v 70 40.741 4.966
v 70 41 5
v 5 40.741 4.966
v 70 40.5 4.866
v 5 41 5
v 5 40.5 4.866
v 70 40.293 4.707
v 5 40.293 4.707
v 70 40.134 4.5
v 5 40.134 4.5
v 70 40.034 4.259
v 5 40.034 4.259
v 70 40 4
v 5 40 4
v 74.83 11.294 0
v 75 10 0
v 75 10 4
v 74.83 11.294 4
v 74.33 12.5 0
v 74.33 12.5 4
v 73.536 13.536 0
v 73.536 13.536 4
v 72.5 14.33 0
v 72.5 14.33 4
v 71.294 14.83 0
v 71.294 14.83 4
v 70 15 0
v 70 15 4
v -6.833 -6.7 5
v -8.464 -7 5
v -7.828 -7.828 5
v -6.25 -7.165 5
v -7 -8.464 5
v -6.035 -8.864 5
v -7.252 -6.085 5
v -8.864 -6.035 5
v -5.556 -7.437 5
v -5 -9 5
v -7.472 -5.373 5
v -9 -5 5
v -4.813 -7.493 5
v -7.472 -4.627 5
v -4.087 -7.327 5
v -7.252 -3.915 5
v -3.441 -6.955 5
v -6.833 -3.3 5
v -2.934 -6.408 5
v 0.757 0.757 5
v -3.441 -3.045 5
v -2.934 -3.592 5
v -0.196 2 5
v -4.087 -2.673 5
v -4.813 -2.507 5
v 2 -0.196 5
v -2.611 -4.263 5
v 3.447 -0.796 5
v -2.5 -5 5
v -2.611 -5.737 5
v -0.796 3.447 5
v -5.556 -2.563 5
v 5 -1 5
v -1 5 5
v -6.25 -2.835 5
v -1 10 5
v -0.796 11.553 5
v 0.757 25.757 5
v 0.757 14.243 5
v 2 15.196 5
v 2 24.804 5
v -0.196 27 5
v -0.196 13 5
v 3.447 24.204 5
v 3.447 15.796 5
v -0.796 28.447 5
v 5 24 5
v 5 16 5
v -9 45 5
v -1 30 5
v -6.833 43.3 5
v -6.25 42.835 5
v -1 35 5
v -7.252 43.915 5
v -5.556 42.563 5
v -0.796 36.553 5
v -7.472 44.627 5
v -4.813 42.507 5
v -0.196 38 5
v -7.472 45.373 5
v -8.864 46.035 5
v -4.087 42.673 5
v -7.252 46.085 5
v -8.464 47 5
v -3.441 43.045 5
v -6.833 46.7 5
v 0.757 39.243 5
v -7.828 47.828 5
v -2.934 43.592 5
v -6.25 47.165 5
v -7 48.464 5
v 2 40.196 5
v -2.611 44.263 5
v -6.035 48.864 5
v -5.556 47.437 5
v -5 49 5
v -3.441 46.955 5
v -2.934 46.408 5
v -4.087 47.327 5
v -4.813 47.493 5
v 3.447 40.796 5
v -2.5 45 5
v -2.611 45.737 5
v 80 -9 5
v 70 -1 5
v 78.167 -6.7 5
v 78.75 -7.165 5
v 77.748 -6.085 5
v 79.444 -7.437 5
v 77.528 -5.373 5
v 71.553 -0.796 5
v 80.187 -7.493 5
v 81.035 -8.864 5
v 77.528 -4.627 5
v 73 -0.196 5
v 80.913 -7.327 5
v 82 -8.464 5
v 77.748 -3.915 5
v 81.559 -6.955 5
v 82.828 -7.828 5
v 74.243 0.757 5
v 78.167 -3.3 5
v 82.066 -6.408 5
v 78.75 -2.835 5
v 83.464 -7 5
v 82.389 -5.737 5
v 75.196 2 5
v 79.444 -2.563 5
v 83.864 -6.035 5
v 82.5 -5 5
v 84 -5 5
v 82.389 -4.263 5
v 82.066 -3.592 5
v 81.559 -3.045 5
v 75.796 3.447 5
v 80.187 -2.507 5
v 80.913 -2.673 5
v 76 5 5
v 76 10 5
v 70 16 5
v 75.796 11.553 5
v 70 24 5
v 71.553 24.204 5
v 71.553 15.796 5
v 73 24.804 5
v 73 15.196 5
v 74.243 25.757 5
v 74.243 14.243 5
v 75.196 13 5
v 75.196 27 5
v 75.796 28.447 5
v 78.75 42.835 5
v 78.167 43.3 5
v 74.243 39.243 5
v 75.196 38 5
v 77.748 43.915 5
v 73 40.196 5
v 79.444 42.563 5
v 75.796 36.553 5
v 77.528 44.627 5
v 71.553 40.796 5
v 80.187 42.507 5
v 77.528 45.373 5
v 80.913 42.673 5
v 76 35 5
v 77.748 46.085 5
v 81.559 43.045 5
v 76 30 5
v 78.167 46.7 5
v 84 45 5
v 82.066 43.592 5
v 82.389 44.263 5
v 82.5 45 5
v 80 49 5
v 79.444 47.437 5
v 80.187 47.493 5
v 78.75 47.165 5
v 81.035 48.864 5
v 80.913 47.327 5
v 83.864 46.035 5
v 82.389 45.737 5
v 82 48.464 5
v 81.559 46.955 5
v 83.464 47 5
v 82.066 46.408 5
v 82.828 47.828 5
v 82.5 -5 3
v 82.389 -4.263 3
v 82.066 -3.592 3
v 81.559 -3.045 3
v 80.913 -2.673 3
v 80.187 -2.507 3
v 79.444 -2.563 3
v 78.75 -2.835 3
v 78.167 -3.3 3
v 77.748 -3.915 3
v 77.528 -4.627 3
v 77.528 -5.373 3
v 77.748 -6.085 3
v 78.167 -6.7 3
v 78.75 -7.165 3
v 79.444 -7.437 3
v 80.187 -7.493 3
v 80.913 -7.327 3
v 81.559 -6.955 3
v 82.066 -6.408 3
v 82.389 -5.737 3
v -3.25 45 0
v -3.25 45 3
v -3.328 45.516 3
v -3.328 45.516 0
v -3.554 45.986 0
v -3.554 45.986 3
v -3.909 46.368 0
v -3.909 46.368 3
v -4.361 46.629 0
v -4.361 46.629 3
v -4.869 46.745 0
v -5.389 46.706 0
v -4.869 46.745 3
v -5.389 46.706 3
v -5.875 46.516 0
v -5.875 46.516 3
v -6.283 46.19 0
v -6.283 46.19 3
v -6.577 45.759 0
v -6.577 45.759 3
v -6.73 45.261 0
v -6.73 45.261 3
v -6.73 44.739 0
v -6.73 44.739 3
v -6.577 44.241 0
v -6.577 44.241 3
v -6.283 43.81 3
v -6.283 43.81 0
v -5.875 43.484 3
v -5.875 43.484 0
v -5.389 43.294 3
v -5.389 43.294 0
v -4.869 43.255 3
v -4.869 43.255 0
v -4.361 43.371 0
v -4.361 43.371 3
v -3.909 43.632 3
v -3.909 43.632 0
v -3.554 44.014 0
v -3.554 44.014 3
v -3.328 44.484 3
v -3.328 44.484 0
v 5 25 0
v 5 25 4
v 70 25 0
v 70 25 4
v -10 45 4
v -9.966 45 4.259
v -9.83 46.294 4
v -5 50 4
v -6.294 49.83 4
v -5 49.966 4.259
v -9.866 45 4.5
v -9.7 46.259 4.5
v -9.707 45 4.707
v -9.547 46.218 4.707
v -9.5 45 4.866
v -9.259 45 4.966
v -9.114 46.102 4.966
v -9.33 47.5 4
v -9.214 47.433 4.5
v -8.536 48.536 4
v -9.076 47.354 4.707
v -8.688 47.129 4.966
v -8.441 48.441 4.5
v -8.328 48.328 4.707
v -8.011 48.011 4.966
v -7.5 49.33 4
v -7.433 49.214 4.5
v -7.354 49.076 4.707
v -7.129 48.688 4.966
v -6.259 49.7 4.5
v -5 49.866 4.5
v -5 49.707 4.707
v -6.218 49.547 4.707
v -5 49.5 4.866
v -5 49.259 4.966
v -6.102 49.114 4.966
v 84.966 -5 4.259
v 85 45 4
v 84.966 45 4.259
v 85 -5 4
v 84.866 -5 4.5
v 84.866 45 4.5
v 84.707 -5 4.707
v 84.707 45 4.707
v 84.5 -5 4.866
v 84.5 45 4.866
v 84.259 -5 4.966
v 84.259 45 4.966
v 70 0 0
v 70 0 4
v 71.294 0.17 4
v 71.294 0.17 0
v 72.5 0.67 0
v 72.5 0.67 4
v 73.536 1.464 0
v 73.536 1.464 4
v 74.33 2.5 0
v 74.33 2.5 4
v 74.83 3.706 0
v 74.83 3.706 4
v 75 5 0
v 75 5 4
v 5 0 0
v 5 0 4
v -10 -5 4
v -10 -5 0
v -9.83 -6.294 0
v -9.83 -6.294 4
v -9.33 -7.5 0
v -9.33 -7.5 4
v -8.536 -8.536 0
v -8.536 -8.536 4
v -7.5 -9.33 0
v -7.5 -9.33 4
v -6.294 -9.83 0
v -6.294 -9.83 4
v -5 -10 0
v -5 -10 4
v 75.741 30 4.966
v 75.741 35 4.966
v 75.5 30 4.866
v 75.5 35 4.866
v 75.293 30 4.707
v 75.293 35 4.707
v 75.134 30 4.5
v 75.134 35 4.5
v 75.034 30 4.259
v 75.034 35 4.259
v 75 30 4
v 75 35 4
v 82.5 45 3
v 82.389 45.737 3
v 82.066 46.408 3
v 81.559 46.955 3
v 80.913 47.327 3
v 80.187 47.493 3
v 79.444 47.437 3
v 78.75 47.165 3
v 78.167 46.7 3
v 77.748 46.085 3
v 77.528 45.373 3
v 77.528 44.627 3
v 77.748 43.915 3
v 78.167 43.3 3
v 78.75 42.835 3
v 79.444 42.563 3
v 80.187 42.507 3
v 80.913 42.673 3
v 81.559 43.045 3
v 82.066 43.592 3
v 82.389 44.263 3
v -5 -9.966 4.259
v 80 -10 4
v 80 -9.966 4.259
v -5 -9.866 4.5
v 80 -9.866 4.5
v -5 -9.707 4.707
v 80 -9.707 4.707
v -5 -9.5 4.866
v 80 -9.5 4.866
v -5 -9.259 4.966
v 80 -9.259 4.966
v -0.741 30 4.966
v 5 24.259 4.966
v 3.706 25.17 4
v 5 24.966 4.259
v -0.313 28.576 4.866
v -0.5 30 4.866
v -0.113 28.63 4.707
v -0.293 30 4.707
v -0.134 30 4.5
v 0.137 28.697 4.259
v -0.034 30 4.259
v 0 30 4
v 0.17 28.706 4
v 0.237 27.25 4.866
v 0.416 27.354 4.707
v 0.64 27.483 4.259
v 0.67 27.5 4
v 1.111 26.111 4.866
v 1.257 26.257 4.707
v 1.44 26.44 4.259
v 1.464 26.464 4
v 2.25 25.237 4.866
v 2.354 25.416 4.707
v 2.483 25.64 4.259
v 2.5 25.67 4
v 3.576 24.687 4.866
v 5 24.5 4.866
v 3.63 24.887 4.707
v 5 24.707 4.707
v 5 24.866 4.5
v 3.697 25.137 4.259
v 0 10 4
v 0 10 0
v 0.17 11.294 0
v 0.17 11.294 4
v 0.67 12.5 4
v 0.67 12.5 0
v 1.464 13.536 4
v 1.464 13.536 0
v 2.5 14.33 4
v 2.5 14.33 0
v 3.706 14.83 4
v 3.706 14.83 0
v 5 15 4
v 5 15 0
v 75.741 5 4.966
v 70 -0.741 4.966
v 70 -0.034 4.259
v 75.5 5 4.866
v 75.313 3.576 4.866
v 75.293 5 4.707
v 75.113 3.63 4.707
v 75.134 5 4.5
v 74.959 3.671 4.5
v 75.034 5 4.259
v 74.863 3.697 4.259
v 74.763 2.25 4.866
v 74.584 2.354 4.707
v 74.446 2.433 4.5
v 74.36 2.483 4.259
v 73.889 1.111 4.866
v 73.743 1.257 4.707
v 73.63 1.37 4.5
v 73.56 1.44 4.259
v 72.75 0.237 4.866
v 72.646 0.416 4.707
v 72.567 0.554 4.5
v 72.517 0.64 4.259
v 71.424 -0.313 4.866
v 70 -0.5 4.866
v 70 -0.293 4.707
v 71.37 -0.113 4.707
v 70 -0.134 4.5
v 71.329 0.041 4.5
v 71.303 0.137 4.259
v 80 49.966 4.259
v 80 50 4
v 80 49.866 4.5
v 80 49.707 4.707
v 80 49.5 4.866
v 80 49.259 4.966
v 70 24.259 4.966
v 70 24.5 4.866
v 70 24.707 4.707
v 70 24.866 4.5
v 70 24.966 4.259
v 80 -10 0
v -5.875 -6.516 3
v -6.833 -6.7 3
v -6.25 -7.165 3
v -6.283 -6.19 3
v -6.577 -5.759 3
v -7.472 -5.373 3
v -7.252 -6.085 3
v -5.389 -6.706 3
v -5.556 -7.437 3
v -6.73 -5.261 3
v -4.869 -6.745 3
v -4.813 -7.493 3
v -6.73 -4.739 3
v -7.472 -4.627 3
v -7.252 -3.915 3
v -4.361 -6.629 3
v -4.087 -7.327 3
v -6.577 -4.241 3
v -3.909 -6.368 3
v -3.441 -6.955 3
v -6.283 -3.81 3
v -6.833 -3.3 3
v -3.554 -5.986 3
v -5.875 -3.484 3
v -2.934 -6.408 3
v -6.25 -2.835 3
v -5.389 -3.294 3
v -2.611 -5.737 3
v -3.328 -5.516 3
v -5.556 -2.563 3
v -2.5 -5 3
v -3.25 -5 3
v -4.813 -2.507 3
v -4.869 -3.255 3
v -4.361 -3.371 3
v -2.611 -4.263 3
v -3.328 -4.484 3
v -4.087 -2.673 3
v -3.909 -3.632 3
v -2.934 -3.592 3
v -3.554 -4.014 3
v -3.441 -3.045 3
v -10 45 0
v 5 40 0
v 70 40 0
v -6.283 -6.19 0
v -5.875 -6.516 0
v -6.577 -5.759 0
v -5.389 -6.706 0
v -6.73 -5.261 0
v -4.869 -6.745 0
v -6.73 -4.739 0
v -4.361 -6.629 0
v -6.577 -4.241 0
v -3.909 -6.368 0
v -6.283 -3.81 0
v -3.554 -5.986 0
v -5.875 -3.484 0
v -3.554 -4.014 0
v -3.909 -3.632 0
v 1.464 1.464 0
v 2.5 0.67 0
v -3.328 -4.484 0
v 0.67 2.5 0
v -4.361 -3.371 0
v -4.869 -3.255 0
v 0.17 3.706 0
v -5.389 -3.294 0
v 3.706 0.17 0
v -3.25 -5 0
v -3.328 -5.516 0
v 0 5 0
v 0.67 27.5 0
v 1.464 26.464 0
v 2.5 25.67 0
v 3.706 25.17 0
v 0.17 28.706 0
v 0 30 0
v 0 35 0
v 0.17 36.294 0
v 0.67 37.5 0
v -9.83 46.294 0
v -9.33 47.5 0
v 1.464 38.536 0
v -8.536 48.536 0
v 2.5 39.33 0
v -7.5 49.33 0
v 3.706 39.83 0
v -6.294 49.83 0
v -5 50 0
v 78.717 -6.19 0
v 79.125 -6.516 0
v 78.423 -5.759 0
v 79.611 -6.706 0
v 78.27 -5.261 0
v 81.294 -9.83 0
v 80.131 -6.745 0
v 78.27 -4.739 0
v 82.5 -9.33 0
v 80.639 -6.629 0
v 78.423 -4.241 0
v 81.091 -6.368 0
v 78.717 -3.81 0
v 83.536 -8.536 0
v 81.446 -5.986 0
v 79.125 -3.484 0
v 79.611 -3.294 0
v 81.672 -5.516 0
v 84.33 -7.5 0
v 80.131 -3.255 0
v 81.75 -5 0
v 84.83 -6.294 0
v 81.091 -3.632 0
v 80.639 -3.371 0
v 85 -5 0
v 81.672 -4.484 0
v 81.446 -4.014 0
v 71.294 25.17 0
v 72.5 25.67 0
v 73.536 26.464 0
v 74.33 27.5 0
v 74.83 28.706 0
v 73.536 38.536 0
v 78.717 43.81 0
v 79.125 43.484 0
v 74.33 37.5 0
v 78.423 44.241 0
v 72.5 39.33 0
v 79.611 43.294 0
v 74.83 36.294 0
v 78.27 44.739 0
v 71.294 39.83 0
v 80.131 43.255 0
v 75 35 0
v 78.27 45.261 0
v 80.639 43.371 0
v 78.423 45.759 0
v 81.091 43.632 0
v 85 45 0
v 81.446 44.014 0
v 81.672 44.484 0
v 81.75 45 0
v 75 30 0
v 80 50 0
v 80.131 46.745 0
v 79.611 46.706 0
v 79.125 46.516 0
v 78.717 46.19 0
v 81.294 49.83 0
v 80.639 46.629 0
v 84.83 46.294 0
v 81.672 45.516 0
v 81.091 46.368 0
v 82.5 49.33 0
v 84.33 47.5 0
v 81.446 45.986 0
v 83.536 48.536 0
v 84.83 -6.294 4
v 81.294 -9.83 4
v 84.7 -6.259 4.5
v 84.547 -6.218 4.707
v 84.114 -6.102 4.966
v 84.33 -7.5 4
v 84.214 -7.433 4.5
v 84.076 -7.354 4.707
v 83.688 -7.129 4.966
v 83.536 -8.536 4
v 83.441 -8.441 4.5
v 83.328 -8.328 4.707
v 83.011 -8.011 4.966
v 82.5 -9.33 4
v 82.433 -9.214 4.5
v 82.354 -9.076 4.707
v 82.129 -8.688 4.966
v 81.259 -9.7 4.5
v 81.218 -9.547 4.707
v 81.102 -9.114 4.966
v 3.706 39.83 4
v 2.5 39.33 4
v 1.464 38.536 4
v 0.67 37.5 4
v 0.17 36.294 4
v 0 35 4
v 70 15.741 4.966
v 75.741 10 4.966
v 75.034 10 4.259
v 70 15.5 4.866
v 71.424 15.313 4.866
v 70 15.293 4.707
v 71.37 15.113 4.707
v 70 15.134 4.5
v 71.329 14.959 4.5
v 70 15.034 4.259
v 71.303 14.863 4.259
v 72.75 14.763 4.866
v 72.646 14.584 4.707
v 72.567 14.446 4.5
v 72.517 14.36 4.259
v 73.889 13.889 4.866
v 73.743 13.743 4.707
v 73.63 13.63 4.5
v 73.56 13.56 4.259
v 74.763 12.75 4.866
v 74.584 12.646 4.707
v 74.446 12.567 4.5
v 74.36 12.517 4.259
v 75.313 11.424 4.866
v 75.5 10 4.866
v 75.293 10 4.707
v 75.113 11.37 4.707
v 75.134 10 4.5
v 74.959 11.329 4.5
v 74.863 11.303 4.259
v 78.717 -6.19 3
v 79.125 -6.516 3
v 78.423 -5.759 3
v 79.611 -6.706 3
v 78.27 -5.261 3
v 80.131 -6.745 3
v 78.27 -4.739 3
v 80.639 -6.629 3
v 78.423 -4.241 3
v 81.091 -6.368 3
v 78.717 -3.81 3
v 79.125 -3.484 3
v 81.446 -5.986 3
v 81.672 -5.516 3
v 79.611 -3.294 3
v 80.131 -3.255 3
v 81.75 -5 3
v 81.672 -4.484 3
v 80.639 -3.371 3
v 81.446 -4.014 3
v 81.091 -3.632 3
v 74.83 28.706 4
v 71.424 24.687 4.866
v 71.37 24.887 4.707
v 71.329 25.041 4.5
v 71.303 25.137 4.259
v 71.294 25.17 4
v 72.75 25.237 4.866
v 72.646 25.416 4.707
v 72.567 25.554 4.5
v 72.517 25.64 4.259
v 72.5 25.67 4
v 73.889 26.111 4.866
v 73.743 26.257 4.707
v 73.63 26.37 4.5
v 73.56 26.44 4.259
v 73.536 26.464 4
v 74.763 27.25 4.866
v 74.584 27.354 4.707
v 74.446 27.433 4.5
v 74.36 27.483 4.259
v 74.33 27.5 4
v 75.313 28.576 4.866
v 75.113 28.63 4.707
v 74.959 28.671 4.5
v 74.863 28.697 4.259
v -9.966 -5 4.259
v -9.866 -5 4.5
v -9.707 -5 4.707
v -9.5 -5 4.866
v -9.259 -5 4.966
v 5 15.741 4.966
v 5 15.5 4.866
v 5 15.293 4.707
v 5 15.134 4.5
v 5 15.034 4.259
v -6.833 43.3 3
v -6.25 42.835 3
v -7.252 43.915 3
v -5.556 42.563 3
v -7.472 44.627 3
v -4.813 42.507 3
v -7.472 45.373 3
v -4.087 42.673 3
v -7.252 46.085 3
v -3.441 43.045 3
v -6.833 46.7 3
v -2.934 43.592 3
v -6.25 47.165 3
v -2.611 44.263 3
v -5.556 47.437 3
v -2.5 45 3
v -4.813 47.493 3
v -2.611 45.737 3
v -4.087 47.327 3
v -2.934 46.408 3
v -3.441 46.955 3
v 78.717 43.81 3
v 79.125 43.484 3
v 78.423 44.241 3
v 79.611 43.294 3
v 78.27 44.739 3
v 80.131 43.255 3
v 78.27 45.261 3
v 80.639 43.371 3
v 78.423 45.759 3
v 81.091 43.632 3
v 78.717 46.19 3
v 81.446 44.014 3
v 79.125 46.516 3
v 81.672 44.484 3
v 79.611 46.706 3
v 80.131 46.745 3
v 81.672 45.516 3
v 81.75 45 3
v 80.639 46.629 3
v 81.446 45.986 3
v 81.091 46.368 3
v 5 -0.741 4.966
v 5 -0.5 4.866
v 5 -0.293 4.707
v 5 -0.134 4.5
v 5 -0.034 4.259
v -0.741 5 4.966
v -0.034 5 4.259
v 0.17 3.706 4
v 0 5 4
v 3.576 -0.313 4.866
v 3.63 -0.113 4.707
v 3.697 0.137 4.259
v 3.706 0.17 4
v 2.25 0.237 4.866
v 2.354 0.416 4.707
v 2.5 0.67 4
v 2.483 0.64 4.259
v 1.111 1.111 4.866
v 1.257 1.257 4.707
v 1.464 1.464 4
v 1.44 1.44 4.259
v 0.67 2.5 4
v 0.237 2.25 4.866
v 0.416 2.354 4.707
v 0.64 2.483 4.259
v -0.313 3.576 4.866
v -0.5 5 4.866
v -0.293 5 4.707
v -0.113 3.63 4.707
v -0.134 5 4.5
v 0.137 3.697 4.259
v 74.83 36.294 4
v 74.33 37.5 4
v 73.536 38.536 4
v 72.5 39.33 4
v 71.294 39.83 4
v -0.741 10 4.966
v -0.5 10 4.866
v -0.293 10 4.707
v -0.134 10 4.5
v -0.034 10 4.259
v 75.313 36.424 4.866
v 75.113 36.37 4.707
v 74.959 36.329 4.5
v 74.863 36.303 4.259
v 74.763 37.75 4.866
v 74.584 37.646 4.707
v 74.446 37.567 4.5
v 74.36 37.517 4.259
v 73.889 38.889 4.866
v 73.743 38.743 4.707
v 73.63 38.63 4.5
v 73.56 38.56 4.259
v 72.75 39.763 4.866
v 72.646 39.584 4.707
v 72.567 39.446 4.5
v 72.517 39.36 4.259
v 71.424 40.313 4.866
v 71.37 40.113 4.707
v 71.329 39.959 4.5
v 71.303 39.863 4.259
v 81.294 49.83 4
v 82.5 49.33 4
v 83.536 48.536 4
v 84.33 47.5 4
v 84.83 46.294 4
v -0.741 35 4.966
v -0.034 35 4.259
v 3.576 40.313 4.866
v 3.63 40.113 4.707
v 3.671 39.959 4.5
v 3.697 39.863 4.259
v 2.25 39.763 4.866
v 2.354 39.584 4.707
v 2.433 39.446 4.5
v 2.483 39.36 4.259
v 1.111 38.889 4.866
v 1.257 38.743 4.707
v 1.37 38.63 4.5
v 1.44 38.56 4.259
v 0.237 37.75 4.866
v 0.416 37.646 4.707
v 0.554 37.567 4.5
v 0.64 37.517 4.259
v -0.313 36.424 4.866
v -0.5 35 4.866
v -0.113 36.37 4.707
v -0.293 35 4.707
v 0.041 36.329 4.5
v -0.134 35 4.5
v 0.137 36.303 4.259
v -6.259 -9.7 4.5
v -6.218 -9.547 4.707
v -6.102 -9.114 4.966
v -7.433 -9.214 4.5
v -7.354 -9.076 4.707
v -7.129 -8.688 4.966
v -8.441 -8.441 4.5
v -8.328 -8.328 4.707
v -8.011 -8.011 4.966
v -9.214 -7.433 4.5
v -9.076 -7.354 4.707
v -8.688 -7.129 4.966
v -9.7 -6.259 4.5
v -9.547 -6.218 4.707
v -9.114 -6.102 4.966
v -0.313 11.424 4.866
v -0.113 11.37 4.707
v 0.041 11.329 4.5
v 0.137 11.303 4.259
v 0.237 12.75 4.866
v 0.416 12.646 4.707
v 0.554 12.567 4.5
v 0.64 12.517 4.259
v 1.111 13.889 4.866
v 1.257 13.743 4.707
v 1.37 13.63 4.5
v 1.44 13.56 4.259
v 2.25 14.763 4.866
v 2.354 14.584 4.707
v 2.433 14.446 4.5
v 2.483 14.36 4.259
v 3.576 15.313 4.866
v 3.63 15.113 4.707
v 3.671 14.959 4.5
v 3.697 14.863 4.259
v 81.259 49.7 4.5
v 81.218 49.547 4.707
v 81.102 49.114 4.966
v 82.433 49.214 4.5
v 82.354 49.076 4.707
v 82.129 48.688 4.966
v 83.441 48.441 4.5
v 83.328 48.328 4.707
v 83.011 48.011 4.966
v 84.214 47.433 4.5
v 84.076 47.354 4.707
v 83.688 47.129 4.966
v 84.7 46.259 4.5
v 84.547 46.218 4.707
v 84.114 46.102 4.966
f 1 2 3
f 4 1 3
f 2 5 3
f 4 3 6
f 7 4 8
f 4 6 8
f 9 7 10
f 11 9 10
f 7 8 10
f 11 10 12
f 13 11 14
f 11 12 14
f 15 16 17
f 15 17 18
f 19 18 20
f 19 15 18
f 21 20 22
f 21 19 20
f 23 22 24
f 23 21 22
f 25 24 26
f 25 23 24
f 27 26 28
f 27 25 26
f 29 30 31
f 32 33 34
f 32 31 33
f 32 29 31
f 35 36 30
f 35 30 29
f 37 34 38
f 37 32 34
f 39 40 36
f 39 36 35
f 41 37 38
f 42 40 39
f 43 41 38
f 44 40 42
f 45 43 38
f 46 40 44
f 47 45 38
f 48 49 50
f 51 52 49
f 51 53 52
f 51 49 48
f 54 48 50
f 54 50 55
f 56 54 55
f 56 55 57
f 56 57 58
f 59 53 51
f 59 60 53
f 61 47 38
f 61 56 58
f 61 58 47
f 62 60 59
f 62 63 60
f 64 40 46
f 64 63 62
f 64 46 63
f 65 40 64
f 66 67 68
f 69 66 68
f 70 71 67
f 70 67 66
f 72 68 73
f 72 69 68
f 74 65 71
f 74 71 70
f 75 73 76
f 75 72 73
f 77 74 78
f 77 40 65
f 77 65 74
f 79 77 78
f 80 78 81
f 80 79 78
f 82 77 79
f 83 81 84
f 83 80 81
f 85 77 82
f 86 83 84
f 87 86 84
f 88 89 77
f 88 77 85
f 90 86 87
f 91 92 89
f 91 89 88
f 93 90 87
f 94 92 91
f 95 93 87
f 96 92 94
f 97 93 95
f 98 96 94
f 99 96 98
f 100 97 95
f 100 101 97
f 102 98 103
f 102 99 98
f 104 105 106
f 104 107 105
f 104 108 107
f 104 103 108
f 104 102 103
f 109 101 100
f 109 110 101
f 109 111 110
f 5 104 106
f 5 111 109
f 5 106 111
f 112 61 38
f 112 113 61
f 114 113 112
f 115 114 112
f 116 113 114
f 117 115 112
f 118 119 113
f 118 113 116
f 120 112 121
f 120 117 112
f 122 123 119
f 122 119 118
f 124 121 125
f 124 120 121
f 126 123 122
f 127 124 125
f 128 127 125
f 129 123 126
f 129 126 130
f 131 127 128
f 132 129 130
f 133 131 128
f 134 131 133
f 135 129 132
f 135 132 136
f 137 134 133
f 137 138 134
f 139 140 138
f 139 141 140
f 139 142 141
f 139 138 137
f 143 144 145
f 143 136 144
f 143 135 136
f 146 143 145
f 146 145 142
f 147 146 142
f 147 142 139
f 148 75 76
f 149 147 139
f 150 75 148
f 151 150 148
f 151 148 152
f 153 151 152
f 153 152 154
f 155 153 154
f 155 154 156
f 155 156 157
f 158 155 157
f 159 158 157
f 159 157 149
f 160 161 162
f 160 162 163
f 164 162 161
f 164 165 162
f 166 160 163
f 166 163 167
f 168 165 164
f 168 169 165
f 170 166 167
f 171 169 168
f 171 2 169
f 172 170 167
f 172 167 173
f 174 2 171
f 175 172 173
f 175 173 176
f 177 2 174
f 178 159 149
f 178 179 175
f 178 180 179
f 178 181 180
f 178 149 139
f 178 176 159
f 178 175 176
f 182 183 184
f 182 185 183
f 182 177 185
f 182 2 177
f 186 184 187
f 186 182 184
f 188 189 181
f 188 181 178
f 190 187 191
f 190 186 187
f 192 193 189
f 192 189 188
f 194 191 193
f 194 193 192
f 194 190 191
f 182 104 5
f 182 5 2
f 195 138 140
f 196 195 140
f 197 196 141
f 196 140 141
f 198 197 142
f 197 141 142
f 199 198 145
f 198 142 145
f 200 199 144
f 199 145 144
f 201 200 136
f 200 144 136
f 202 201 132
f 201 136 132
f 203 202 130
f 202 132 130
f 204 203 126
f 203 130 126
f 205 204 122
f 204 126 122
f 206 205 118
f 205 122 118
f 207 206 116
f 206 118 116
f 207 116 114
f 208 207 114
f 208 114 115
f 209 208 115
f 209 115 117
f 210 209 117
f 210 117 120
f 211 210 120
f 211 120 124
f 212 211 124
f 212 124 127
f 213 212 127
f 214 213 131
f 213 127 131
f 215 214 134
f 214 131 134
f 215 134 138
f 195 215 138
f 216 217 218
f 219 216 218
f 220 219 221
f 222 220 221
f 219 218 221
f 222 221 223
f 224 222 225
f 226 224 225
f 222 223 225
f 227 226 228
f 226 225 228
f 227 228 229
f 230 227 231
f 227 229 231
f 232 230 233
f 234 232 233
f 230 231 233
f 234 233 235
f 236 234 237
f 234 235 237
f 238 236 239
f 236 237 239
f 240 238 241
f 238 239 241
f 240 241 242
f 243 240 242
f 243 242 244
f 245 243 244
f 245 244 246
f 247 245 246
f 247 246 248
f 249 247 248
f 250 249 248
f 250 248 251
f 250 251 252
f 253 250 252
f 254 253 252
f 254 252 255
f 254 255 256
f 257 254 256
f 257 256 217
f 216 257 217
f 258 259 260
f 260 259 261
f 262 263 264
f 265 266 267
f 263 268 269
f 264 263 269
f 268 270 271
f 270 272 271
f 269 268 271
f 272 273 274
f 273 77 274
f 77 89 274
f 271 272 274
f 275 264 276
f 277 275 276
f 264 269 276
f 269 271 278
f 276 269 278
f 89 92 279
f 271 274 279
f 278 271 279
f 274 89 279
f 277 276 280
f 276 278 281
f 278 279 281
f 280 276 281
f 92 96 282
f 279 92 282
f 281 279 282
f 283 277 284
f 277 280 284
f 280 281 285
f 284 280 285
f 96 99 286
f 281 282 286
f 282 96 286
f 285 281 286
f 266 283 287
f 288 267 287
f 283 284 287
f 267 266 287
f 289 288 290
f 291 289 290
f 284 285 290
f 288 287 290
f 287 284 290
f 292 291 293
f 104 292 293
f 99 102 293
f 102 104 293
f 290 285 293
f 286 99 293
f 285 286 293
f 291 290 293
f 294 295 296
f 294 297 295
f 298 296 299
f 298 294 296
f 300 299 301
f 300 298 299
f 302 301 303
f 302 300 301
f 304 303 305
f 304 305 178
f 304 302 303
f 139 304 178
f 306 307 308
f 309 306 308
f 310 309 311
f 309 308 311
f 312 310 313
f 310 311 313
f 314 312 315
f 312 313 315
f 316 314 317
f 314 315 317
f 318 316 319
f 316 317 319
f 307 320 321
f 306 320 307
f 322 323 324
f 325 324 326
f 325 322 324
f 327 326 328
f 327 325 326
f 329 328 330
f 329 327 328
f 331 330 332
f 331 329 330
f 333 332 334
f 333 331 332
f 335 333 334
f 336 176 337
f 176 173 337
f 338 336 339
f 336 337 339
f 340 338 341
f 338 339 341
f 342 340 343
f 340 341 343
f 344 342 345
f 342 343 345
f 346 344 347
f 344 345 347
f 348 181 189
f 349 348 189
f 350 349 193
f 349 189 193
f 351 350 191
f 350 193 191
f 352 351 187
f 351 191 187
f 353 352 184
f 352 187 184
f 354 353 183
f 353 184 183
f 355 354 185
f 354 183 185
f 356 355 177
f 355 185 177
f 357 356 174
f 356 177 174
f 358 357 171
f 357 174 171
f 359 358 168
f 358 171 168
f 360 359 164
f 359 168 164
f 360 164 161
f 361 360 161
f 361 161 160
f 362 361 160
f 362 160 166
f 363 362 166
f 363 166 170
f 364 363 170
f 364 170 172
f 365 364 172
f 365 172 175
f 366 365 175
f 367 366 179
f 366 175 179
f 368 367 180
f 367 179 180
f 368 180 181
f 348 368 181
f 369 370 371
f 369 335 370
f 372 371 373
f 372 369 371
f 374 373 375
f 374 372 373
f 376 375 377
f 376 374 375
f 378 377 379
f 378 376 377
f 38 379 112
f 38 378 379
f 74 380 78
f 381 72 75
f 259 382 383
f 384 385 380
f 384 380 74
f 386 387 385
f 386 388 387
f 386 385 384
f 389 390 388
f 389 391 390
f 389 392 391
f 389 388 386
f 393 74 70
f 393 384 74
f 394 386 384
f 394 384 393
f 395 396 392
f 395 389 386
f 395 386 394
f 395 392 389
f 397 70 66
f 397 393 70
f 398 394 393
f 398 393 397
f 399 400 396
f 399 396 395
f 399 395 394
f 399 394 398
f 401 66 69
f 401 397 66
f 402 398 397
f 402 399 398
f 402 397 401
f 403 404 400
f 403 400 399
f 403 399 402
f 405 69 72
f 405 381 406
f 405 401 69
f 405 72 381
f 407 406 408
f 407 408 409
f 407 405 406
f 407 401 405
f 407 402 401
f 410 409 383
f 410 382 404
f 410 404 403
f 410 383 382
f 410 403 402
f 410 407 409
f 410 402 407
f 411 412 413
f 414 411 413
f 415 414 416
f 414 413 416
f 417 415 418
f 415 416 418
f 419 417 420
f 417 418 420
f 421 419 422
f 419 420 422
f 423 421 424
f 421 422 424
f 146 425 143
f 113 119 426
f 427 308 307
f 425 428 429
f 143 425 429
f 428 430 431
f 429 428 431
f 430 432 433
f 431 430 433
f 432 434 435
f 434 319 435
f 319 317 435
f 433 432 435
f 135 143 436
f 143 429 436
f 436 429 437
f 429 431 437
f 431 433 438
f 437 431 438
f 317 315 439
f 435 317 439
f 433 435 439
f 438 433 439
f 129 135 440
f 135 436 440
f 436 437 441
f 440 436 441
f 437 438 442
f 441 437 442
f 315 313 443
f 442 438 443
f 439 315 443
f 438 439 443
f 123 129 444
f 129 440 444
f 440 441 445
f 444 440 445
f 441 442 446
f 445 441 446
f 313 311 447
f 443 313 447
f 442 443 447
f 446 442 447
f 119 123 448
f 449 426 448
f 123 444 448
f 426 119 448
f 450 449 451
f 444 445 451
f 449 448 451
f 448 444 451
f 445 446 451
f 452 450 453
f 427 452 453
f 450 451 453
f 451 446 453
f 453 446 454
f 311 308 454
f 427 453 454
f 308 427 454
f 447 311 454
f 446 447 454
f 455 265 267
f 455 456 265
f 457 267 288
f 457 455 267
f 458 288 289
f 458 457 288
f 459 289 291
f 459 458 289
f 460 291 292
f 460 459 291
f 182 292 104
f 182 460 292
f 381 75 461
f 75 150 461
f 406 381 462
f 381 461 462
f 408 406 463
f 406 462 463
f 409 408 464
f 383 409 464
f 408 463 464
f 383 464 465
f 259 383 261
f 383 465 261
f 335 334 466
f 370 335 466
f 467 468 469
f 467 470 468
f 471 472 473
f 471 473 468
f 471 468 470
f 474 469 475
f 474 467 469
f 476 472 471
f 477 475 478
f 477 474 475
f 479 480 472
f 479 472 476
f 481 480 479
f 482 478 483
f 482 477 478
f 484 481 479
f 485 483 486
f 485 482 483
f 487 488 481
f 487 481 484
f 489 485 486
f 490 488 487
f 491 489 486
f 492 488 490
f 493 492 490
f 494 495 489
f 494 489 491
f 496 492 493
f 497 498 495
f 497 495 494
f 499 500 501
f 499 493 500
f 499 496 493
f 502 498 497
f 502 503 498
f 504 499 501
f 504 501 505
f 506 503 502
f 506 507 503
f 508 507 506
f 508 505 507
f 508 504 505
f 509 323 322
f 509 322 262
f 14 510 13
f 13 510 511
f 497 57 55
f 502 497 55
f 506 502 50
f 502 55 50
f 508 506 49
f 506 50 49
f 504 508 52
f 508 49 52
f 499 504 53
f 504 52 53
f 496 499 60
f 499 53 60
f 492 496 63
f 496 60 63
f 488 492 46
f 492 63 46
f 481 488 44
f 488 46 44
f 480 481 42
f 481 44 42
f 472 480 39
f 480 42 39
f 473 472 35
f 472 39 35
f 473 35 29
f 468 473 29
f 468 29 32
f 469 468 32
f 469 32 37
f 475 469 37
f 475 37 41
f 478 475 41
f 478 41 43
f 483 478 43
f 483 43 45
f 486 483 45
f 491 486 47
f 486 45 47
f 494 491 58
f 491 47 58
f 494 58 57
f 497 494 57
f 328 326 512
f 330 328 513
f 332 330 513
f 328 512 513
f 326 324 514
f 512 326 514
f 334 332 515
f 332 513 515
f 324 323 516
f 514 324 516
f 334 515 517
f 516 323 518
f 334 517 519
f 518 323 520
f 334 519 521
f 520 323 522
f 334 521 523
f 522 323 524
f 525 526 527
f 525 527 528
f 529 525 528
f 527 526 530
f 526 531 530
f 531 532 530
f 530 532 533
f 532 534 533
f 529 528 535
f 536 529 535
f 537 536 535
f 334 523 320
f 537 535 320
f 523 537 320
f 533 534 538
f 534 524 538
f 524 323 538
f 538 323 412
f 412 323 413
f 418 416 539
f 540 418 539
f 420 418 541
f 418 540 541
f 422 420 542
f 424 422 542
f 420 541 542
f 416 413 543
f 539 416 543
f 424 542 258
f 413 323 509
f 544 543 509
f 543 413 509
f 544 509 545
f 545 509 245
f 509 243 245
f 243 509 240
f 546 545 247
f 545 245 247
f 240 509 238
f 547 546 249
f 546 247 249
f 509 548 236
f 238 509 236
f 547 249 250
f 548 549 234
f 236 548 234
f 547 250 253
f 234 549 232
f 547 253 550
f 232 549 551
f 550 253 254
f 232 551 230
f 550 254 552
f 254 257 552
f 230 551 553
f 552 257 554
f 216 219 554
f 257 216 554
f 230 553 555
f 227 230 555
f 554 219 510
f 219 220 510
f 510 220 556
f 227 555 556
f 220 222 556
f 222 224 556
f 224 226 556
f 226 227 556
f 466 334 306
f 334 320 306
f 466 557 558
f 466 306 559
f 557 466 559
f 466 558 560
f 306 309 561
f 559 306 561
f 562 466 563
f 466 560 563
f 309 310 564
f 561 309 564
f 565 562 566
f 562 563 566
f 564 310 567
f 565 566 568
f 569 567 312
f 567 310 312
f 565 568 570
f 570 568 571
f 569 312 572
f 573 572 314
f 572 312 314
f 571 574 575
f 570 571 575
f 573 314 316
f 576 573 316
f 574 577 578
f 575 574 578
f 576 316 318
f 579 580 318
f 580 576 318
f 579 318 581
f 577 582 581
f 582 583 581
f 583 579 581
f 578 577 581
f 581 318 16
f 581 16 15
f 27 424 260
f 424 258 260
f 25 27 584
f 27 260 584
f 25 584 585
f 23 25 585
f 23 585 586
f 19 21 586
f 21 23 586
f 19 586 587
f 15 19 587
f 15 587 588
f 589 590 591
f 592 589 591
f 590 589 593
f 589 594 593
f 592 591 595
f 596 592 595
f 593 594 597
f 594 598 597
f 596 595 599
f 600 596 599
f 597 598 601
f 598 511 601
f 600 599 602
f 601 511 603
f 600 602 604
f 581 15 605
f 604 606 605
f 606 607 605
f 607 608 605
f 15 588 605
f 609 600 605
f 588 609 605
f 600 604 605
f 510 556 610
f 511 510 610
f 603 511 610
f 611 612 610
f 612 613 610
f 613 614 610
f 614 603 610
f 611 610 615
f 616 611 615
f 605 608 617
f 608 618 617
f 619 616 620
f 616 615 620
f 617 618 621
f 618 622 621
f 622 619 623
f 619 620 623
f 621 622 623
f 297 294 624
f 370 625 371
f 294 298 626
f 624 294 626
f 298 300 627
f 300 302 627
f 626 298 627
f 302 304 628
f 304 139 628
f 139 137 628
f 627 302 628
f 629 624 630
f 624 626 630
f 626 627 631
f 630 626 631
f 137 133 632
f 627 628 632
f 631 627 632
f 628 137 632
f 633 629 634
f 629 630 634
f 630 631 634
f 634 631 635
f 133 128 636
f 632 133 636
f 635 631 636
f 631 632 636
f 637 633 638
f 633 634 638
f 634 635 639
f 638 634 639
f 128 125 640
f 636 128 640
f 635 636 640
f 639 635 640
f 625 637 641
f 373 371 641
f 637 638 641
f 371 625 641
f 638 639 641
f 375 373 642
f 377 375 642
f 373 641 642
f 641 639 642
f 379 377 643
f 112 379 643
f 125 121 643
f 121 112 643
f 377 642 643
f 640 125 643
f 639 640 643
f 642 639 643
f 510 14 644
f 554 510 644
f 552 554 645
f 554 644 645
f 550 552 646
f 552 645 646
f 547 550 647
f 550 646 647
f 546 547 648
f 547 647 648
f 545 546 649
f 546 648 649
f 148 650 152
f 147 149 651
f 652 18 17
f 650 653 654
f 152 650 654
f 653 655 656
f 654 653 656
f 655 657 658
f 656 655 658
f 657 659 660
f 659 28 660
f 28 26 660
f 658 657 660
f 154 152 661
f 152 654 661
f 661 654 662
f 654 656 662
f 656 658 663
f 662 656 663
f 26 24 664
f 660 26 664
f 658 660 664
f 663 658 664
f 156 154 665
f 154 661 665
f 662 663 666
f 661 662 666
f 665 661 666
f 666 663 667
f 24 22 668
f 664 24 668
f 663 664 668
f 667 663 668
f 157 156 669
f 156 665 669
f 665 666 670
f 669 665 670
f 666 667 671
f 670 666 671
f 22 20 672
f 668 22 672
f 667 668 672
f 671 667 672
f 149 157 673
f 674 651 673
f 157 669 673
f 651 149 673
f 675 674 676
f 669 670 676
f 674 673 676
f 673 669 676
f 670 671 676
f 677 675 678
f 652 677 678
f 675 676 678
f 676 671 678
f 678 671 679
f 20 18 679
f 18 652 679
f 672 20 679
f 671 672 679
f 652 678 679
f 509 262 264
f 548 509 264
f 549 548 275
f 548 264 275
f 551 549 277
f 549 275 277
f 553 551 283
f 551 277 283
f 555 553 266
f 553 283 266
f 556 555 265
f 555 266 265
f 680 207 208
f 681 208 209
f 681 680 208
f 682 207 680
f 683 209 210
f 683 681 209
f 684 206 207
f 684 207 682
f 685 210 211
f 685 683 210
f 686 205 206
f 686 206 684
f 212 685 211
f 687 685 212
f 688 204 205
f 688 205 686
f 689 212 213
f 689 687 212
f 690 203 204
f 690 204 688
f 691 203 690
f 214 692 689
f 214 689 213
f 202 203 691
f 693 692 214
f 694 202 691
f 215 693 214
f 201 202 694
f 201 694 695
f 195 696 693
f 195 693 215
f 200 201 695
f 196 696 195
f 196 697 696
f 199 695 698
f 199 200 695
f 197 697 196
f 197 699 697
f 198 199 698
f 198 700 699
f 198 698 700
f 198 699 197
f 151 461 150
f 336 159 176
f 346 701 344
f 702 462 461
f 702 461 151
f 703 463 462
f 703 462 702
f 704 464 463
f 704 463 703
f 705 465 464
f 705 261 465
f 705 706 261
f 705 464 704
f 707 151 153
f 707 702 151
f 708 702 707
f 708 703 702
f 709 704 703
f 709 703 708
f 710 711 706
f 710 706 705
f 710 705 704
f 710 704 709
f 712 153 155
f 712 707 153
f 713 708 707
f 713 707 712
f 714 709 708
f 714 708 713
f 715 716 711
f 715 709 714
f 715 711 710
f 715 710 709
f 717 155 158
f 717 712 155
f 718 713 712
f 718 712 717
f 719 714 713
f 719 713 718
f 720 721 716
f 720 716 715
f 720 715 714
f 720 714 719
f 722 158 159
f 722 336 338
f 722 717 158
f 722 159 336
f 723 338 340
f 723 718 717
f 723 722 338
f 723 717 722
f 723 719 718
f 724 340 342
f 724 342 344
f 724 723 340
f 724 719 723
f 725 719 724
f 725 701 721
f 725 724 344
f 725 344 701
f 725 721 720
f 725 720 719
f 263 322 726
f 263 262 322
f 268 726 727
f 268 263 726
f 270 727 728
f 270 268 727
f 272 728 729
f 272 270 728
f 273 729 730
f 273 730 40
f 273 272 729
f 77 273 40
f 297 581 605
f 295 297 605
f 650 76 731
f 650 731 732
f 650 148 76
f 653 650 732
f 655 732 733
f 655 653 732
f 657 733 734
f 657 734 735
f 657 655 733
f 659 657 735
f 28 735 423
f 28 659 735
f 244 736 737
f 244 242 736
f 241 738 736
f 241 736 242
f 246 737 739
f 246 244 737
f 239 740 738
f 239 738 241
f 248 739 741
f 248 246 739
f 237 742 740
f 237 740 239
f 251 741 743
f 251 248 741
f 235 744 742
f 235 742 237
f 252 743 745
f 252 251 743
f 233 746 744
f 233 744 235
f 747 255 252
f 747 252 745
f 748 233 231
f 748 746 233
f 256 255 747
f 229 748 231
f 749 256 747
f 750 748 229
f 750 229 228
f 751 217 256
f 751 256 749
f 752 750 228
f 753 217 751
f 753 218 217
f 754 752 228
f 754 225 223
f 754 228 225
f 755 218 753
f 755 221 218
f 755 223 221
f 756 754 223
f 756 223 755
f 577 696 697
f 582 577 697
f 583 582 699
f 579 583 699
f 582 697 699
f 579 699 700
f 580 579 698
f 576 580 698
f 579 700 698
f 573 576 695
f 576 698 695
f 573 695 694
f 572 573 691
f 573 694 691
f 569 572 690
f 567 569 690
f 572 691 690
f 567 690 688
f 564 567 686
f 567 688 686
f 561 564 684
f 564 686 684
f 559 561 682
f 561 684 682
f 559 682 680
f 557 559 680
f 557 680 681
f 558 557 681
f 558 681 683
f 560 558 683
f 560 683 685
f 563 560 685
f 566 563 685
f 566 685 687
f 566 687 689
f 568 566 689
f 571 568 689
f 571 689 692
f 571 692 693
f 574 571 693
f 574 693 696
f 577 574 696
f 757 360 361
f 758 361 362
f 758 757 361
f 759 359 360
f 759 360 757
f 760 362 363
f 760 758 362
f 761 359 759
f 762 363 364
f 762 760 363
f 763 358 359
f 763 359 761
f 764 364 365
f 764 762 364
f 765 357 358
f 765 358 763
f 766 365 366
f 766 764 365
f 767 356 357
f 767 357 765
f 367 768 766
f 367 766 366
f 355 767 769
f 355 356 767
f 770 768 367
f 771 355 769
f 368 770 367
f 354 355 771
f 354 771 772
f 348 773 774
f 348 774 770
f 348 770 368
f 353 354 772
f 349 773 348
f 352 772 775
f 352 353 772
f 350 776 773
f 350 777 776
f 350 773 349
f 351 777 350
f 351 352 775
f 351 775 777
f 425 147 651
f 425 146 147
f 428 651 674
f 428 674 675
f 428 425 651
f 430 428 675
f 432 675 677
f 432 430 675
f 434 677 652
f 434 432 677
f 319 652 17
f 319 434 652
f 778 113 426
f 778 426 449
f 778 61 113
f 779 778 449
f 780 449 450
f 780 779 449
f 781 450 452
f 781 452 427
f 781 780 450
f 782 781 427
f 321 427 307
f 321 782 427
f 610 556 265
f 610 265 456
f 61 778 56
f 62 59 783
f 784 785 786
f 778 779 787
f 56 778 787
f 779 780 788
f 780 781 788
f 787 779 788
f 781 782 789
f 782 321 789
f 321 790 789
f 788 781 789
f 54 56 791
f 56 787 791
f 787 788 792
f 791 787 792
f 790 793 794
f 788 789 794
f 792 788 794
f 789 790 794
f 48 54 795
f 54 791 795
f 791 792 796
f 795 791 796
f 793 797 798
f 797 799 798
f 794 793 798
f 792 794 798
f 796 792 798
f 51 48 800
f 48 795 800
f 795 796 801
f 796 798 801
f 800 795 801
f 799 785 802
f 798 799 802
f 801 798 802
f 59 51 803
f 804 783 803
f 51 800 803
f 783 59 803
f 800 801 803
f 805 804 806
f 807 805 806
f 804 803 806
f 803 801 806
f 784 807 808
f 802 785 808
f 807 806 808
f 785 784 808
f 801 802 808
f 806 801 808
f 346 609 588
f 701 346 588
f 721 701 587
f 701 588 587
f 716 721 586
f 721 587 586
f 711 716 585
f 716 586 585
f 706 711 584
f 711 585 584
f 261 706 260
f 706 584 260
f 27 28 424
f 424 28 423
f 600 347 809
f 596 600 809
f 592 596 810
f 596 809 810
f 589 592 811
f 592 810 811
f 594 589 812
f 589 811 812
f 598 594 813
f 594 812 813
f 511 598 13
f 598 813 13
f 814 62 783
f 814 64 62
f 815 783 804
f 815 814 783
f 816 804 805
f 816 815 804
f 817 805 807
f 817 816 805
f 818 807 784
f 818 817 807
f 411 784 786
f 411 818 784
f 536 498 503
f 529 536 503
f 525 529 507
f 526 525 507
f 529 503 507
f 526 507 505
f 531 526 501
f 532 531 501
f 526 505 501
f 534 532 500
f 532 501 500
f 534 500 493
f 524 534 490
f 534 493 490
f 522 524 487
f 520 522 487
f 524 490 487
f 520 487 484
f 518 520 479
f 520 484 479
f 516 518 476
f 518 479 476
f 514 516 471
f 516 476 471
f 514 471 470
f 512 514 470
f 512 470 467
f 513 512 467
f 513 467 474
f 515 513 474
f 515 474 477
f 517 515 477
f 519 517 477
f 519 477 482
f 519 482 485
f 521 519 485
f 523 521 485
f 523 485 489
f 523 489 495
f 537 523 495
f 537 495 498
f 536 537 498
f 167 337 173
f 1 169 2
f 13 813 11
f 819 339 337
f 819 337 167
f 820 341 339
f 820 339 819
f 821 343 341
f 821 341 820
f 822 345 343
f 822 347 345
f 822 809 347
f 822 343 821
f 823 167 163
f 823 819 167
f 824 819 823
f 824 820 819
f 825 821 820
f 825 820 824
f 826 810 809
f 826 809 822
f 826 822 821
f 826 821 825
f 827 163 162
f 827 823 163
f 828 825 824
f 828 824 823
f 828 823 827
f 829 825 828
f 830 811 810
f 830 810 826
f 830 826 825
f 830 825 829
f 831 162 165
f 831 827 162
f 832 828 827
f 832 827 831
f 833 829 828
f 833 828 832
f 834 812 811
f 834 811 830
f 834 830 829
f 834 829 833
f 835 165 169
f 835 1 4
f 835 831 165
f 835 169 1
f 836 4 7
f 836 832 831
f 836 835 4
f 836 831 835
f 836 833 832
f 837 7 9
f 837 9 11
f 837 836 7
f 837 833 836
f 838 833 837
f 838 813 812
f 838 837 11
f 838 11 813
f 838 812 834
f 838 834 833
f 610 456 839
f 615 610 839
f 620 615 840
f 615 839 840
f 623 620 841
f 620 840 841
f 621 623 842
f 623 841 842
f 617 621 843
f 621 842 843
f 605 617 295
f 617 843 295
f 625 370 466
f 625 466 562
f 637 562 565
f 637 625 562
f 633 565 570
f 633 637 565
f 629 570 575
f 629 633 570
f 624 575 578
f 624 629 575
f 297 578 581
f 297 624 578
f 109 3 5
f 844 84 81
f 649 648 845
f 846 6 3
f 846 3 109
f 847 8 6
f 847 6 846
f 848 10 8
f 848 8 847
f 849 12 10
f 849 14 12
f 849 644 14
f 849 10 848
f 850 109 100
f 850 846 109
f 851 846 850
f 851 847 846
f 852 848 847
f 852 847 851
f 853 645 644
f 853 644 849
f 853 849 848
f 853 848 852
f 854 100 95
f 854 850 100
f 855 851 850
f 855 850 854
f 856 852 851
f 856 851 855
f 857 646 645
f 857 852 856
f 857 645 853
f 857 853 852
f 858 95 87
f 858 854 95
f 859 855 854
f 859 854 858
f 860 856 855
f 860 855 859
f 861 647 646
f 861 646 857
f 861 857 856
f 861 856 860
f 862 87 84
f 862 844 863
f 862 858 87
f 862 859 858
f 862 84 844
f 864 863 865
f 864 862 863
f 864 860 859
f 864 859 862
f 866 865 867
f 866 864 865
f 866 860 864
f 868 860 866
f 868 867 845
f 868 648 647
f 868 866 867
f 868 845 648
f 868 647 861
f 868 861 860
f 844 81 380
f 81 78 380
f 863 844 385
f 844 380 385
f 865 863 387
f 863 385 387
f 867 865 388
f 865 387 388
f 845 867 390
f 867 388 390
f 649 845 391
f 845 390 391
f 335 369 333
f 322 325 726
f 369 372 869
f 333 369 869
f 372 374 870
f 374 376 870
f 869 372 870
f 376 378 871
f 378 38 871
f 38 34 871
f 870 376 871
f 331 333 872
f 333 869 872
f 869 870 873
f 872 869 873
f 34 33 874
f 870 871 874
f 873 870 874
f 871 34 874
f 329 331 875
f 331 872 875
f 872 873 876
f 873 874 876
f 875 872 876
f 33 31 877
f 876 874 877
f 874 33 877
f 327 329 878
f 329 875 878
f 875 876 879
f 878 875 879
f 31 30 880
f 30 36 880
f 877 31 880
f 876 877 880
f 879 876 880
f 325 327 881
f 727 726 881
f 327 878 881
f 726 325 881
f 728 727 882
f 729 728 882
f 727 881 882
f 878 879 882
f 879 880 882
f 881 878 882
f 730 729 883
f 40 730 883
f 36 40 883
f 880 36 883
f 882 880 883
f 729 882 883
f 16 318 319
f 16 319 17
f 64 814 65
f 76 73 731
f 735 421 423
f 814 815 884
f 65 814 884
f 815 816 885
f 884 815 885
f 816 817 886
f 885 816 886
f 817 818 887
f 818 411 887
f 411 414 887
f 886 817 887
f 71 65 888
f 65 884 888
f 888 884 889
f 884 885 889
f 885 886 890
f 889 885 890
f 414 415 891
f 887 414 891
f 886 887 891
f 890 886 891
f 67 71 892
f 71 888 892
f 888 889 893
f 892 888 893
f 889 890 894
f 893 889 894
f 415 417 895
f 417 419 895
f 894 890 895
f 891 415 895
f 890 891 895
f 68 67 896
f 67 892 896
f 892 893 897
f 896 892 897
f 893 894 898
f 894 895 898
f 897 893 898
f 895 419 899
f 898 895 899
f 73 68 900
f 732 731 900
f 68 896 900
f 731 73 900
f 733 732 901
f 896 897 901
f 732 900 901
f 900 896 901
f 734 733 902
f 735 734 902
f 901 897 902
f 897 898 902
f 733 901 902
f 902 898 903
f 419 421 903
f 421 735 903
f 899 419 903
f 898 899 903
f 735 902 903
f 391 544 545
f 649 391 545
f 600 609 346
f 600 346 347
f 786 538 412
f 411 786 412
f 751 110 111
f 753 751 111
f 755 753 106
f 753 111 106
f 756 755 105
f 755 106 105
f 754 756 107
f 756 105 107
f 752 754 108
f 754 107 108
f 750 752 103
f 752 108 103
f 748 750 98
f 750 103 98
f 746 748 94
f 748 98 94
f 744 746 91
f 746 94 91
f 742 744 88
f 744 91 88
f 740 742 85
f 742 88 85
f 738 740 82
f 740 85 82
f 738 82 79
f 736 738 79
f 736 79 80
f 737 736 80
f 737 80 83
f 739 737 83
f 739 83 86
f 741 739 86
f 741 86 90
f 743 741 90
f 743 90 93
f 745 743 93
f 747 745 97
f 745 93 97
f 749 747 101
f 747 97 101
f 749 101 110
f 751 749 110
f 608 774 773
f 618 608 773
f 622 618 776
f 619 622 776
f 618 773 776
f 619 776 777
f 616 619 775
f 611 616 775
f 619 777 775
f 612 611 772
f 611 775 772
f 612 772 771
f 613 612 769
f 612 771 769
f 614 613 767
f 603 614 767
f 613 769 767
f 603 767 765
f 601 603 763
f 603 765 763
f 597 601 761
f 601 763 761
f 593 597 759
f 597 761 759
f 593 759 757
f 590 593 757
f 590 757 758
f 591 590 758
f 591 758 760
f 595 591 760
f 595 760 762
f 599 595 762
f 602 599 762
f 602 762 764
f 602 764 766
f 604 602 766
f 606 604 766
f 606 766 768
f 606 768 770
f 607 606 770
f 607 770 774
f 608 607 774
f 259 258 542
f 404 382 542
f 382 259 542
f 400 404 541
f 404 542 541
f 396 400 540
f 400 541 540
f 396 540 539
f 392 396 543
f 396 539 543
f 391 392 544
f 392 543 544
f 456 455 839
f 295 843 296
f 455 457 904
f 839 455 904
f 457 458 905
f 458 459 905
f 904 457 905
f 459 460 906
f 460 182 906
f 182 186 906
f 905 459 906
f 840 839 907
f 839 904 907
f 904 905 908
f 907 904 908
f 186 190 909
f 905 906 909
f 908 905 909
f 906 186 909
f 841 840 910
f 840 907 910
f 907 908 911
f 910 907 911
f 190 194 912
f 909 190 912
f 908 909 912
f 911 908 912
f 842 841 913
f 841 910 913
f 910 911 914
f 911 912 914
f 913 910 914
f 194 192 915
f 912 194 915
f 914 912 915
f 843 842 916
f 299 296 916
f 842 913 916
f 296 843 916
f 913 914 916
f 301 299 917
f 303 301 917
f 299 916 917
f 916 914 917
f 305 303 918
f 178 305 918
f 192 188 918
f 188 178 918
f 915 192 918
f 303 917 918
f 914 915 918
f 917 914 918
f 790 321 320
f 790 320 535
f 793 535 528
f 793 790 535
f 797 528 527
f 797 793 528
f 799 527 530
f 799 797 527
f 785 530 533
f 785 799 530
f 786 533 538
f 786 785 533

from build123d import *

# Parameters (mm, degrees)
SKETCH1_W           = 95
SKETCH1_H           = 60
SKETCH1_W_2         = 75
SKETCH1_H_2         = 40
BOSS_EXTRUDE1_DEPTH = 5
BOSS_EXTRUDE2_DEPTH = 5
SKETCH5_R           = 1.75
CUT_EXTRUDE2_DEPTH  = 99.742088291
SKETCH6_R           = 2.5
CUT_EXTRUDE3_DEPTH  = 2
FILLET1_R           = 5
FILLET2_R           = 1


with BuildPart() as part:
    # Sketch1 → Boss-Extrude1 (new body)
    with BuildSketch(Plane.XY):
        with Locations((37.5, 20)):
            Rectangle(SKETCH1_W, SKETCH1_H)
        with Locations((37.5, 20)):
            Rectangle(SKETCH1_W_2, SKETCH1_H_2, mode=Mode.SUBTRACT)
    extrude(amount=BOSS_EXTRUDE1_DEPTH)

    # Sketch2 → Boss-Extrude2 (add)
    with BuildSketch(Plane.XY.offset(5)):
        Polygon((0, 25), (75, 25), (75, 20), (75, 15), (0, 15), (0, 20), align=None)
    extrude(amount=-BOSS_EXTRUDE2_DEPTH)

    # Sketch5 → Cut-Extrude2 (cut, through all)
    with BuildSketch(Plane.XY.offset(5)):
        with Locations((-5, 45)):
            Circle(SKETCH5_R)
        with Locations((80, 45)):
            Circle(SKETCH5_R)
        with Locations((80, -5)):
            Circle(SKETCH5_R)
        with Locations((-5, -5)):
            Circle(SKETCH5_R)
    extrude(amount=-CUT_EXTRUDE2_DEPTH, mode=Mode.SUBTRACT)

    # Sketch6 → Cut-Extrude3 (cut)
    with BuildSketch(Plane.XY.offset(5)):
        with Locations((-5, 45)):
            Circle(SKETCH6_R)
        with Locations((80, 45)):
            Circle(SKETCH6_R)
        with Locations((80, -5)):
            Circle(SKETCH6_R)
        with Locations((-5, -5)):
            Circle(SKETCH6_R)
    extrude(amount=-CUT_EXTRUDE3_DEPTH, mode=Mode.SUBTRACT)

    # Fillet1
    fillet1_edges = [part.edges().sort_by_distance(p)[0] for p in [
        (0, 40, 2.5),
        (0, 0, 2.5),
        (75, 0, 2.5),
        (75, 40, 2.5),
        (0, 15, 2.5),
        (0, 25, 2.5),
        (75, 25, 2.5),
        (75, 15, 2.5),
        (-10, 50, 2.5),
        (85, 50, 2.5),
        (85, -10, 2.5),
        (-10, -10, 2.5),
    ]]
    fillet(fillet1_edges, radius=FILLET1_R)

    # Fillet2
    fillet2_edges = [part.edges().sort_by_distance(p)[0] for p in [
        (0, 7.5, 5),
        (37.5, 15, 5),
        (37.5, 0, 5),
        (75, 7.5, 5),
        (37.5, 25, 5),
        (0, 32.5, 5),
        (75, 32.5, 5),
        (37.5, 40, 5),
        (-10, 20, 5),
        (37.5, 50, 5),
        (37.5, -10, 5),
        (85, 20, 5),
        (-8.535533906, -8.535533906, 5),
        (83.535533906, -8.535533906, 5),
        (83.535533906, 48.535533906, 5),
        (-8.535533906, 48.535533906, 5),
        (1.464466094, 13.535533906, 5),
        (73.535533906, 1.464466094, 5),
        (73.535533906, 13.535533906, 5),
        (1.464466094, 1.464466094, 5),
        (1.464466094, 26.464466094, 5),
        (73.535533906, 26.464466094, 5),
        (73.535533906, 38.535533906, 5),
        (1.464466094, 38.535533906, 5),
    ]]
    fillet(fillet2_edges, radius=FILLET2_R)


solid = part.part
